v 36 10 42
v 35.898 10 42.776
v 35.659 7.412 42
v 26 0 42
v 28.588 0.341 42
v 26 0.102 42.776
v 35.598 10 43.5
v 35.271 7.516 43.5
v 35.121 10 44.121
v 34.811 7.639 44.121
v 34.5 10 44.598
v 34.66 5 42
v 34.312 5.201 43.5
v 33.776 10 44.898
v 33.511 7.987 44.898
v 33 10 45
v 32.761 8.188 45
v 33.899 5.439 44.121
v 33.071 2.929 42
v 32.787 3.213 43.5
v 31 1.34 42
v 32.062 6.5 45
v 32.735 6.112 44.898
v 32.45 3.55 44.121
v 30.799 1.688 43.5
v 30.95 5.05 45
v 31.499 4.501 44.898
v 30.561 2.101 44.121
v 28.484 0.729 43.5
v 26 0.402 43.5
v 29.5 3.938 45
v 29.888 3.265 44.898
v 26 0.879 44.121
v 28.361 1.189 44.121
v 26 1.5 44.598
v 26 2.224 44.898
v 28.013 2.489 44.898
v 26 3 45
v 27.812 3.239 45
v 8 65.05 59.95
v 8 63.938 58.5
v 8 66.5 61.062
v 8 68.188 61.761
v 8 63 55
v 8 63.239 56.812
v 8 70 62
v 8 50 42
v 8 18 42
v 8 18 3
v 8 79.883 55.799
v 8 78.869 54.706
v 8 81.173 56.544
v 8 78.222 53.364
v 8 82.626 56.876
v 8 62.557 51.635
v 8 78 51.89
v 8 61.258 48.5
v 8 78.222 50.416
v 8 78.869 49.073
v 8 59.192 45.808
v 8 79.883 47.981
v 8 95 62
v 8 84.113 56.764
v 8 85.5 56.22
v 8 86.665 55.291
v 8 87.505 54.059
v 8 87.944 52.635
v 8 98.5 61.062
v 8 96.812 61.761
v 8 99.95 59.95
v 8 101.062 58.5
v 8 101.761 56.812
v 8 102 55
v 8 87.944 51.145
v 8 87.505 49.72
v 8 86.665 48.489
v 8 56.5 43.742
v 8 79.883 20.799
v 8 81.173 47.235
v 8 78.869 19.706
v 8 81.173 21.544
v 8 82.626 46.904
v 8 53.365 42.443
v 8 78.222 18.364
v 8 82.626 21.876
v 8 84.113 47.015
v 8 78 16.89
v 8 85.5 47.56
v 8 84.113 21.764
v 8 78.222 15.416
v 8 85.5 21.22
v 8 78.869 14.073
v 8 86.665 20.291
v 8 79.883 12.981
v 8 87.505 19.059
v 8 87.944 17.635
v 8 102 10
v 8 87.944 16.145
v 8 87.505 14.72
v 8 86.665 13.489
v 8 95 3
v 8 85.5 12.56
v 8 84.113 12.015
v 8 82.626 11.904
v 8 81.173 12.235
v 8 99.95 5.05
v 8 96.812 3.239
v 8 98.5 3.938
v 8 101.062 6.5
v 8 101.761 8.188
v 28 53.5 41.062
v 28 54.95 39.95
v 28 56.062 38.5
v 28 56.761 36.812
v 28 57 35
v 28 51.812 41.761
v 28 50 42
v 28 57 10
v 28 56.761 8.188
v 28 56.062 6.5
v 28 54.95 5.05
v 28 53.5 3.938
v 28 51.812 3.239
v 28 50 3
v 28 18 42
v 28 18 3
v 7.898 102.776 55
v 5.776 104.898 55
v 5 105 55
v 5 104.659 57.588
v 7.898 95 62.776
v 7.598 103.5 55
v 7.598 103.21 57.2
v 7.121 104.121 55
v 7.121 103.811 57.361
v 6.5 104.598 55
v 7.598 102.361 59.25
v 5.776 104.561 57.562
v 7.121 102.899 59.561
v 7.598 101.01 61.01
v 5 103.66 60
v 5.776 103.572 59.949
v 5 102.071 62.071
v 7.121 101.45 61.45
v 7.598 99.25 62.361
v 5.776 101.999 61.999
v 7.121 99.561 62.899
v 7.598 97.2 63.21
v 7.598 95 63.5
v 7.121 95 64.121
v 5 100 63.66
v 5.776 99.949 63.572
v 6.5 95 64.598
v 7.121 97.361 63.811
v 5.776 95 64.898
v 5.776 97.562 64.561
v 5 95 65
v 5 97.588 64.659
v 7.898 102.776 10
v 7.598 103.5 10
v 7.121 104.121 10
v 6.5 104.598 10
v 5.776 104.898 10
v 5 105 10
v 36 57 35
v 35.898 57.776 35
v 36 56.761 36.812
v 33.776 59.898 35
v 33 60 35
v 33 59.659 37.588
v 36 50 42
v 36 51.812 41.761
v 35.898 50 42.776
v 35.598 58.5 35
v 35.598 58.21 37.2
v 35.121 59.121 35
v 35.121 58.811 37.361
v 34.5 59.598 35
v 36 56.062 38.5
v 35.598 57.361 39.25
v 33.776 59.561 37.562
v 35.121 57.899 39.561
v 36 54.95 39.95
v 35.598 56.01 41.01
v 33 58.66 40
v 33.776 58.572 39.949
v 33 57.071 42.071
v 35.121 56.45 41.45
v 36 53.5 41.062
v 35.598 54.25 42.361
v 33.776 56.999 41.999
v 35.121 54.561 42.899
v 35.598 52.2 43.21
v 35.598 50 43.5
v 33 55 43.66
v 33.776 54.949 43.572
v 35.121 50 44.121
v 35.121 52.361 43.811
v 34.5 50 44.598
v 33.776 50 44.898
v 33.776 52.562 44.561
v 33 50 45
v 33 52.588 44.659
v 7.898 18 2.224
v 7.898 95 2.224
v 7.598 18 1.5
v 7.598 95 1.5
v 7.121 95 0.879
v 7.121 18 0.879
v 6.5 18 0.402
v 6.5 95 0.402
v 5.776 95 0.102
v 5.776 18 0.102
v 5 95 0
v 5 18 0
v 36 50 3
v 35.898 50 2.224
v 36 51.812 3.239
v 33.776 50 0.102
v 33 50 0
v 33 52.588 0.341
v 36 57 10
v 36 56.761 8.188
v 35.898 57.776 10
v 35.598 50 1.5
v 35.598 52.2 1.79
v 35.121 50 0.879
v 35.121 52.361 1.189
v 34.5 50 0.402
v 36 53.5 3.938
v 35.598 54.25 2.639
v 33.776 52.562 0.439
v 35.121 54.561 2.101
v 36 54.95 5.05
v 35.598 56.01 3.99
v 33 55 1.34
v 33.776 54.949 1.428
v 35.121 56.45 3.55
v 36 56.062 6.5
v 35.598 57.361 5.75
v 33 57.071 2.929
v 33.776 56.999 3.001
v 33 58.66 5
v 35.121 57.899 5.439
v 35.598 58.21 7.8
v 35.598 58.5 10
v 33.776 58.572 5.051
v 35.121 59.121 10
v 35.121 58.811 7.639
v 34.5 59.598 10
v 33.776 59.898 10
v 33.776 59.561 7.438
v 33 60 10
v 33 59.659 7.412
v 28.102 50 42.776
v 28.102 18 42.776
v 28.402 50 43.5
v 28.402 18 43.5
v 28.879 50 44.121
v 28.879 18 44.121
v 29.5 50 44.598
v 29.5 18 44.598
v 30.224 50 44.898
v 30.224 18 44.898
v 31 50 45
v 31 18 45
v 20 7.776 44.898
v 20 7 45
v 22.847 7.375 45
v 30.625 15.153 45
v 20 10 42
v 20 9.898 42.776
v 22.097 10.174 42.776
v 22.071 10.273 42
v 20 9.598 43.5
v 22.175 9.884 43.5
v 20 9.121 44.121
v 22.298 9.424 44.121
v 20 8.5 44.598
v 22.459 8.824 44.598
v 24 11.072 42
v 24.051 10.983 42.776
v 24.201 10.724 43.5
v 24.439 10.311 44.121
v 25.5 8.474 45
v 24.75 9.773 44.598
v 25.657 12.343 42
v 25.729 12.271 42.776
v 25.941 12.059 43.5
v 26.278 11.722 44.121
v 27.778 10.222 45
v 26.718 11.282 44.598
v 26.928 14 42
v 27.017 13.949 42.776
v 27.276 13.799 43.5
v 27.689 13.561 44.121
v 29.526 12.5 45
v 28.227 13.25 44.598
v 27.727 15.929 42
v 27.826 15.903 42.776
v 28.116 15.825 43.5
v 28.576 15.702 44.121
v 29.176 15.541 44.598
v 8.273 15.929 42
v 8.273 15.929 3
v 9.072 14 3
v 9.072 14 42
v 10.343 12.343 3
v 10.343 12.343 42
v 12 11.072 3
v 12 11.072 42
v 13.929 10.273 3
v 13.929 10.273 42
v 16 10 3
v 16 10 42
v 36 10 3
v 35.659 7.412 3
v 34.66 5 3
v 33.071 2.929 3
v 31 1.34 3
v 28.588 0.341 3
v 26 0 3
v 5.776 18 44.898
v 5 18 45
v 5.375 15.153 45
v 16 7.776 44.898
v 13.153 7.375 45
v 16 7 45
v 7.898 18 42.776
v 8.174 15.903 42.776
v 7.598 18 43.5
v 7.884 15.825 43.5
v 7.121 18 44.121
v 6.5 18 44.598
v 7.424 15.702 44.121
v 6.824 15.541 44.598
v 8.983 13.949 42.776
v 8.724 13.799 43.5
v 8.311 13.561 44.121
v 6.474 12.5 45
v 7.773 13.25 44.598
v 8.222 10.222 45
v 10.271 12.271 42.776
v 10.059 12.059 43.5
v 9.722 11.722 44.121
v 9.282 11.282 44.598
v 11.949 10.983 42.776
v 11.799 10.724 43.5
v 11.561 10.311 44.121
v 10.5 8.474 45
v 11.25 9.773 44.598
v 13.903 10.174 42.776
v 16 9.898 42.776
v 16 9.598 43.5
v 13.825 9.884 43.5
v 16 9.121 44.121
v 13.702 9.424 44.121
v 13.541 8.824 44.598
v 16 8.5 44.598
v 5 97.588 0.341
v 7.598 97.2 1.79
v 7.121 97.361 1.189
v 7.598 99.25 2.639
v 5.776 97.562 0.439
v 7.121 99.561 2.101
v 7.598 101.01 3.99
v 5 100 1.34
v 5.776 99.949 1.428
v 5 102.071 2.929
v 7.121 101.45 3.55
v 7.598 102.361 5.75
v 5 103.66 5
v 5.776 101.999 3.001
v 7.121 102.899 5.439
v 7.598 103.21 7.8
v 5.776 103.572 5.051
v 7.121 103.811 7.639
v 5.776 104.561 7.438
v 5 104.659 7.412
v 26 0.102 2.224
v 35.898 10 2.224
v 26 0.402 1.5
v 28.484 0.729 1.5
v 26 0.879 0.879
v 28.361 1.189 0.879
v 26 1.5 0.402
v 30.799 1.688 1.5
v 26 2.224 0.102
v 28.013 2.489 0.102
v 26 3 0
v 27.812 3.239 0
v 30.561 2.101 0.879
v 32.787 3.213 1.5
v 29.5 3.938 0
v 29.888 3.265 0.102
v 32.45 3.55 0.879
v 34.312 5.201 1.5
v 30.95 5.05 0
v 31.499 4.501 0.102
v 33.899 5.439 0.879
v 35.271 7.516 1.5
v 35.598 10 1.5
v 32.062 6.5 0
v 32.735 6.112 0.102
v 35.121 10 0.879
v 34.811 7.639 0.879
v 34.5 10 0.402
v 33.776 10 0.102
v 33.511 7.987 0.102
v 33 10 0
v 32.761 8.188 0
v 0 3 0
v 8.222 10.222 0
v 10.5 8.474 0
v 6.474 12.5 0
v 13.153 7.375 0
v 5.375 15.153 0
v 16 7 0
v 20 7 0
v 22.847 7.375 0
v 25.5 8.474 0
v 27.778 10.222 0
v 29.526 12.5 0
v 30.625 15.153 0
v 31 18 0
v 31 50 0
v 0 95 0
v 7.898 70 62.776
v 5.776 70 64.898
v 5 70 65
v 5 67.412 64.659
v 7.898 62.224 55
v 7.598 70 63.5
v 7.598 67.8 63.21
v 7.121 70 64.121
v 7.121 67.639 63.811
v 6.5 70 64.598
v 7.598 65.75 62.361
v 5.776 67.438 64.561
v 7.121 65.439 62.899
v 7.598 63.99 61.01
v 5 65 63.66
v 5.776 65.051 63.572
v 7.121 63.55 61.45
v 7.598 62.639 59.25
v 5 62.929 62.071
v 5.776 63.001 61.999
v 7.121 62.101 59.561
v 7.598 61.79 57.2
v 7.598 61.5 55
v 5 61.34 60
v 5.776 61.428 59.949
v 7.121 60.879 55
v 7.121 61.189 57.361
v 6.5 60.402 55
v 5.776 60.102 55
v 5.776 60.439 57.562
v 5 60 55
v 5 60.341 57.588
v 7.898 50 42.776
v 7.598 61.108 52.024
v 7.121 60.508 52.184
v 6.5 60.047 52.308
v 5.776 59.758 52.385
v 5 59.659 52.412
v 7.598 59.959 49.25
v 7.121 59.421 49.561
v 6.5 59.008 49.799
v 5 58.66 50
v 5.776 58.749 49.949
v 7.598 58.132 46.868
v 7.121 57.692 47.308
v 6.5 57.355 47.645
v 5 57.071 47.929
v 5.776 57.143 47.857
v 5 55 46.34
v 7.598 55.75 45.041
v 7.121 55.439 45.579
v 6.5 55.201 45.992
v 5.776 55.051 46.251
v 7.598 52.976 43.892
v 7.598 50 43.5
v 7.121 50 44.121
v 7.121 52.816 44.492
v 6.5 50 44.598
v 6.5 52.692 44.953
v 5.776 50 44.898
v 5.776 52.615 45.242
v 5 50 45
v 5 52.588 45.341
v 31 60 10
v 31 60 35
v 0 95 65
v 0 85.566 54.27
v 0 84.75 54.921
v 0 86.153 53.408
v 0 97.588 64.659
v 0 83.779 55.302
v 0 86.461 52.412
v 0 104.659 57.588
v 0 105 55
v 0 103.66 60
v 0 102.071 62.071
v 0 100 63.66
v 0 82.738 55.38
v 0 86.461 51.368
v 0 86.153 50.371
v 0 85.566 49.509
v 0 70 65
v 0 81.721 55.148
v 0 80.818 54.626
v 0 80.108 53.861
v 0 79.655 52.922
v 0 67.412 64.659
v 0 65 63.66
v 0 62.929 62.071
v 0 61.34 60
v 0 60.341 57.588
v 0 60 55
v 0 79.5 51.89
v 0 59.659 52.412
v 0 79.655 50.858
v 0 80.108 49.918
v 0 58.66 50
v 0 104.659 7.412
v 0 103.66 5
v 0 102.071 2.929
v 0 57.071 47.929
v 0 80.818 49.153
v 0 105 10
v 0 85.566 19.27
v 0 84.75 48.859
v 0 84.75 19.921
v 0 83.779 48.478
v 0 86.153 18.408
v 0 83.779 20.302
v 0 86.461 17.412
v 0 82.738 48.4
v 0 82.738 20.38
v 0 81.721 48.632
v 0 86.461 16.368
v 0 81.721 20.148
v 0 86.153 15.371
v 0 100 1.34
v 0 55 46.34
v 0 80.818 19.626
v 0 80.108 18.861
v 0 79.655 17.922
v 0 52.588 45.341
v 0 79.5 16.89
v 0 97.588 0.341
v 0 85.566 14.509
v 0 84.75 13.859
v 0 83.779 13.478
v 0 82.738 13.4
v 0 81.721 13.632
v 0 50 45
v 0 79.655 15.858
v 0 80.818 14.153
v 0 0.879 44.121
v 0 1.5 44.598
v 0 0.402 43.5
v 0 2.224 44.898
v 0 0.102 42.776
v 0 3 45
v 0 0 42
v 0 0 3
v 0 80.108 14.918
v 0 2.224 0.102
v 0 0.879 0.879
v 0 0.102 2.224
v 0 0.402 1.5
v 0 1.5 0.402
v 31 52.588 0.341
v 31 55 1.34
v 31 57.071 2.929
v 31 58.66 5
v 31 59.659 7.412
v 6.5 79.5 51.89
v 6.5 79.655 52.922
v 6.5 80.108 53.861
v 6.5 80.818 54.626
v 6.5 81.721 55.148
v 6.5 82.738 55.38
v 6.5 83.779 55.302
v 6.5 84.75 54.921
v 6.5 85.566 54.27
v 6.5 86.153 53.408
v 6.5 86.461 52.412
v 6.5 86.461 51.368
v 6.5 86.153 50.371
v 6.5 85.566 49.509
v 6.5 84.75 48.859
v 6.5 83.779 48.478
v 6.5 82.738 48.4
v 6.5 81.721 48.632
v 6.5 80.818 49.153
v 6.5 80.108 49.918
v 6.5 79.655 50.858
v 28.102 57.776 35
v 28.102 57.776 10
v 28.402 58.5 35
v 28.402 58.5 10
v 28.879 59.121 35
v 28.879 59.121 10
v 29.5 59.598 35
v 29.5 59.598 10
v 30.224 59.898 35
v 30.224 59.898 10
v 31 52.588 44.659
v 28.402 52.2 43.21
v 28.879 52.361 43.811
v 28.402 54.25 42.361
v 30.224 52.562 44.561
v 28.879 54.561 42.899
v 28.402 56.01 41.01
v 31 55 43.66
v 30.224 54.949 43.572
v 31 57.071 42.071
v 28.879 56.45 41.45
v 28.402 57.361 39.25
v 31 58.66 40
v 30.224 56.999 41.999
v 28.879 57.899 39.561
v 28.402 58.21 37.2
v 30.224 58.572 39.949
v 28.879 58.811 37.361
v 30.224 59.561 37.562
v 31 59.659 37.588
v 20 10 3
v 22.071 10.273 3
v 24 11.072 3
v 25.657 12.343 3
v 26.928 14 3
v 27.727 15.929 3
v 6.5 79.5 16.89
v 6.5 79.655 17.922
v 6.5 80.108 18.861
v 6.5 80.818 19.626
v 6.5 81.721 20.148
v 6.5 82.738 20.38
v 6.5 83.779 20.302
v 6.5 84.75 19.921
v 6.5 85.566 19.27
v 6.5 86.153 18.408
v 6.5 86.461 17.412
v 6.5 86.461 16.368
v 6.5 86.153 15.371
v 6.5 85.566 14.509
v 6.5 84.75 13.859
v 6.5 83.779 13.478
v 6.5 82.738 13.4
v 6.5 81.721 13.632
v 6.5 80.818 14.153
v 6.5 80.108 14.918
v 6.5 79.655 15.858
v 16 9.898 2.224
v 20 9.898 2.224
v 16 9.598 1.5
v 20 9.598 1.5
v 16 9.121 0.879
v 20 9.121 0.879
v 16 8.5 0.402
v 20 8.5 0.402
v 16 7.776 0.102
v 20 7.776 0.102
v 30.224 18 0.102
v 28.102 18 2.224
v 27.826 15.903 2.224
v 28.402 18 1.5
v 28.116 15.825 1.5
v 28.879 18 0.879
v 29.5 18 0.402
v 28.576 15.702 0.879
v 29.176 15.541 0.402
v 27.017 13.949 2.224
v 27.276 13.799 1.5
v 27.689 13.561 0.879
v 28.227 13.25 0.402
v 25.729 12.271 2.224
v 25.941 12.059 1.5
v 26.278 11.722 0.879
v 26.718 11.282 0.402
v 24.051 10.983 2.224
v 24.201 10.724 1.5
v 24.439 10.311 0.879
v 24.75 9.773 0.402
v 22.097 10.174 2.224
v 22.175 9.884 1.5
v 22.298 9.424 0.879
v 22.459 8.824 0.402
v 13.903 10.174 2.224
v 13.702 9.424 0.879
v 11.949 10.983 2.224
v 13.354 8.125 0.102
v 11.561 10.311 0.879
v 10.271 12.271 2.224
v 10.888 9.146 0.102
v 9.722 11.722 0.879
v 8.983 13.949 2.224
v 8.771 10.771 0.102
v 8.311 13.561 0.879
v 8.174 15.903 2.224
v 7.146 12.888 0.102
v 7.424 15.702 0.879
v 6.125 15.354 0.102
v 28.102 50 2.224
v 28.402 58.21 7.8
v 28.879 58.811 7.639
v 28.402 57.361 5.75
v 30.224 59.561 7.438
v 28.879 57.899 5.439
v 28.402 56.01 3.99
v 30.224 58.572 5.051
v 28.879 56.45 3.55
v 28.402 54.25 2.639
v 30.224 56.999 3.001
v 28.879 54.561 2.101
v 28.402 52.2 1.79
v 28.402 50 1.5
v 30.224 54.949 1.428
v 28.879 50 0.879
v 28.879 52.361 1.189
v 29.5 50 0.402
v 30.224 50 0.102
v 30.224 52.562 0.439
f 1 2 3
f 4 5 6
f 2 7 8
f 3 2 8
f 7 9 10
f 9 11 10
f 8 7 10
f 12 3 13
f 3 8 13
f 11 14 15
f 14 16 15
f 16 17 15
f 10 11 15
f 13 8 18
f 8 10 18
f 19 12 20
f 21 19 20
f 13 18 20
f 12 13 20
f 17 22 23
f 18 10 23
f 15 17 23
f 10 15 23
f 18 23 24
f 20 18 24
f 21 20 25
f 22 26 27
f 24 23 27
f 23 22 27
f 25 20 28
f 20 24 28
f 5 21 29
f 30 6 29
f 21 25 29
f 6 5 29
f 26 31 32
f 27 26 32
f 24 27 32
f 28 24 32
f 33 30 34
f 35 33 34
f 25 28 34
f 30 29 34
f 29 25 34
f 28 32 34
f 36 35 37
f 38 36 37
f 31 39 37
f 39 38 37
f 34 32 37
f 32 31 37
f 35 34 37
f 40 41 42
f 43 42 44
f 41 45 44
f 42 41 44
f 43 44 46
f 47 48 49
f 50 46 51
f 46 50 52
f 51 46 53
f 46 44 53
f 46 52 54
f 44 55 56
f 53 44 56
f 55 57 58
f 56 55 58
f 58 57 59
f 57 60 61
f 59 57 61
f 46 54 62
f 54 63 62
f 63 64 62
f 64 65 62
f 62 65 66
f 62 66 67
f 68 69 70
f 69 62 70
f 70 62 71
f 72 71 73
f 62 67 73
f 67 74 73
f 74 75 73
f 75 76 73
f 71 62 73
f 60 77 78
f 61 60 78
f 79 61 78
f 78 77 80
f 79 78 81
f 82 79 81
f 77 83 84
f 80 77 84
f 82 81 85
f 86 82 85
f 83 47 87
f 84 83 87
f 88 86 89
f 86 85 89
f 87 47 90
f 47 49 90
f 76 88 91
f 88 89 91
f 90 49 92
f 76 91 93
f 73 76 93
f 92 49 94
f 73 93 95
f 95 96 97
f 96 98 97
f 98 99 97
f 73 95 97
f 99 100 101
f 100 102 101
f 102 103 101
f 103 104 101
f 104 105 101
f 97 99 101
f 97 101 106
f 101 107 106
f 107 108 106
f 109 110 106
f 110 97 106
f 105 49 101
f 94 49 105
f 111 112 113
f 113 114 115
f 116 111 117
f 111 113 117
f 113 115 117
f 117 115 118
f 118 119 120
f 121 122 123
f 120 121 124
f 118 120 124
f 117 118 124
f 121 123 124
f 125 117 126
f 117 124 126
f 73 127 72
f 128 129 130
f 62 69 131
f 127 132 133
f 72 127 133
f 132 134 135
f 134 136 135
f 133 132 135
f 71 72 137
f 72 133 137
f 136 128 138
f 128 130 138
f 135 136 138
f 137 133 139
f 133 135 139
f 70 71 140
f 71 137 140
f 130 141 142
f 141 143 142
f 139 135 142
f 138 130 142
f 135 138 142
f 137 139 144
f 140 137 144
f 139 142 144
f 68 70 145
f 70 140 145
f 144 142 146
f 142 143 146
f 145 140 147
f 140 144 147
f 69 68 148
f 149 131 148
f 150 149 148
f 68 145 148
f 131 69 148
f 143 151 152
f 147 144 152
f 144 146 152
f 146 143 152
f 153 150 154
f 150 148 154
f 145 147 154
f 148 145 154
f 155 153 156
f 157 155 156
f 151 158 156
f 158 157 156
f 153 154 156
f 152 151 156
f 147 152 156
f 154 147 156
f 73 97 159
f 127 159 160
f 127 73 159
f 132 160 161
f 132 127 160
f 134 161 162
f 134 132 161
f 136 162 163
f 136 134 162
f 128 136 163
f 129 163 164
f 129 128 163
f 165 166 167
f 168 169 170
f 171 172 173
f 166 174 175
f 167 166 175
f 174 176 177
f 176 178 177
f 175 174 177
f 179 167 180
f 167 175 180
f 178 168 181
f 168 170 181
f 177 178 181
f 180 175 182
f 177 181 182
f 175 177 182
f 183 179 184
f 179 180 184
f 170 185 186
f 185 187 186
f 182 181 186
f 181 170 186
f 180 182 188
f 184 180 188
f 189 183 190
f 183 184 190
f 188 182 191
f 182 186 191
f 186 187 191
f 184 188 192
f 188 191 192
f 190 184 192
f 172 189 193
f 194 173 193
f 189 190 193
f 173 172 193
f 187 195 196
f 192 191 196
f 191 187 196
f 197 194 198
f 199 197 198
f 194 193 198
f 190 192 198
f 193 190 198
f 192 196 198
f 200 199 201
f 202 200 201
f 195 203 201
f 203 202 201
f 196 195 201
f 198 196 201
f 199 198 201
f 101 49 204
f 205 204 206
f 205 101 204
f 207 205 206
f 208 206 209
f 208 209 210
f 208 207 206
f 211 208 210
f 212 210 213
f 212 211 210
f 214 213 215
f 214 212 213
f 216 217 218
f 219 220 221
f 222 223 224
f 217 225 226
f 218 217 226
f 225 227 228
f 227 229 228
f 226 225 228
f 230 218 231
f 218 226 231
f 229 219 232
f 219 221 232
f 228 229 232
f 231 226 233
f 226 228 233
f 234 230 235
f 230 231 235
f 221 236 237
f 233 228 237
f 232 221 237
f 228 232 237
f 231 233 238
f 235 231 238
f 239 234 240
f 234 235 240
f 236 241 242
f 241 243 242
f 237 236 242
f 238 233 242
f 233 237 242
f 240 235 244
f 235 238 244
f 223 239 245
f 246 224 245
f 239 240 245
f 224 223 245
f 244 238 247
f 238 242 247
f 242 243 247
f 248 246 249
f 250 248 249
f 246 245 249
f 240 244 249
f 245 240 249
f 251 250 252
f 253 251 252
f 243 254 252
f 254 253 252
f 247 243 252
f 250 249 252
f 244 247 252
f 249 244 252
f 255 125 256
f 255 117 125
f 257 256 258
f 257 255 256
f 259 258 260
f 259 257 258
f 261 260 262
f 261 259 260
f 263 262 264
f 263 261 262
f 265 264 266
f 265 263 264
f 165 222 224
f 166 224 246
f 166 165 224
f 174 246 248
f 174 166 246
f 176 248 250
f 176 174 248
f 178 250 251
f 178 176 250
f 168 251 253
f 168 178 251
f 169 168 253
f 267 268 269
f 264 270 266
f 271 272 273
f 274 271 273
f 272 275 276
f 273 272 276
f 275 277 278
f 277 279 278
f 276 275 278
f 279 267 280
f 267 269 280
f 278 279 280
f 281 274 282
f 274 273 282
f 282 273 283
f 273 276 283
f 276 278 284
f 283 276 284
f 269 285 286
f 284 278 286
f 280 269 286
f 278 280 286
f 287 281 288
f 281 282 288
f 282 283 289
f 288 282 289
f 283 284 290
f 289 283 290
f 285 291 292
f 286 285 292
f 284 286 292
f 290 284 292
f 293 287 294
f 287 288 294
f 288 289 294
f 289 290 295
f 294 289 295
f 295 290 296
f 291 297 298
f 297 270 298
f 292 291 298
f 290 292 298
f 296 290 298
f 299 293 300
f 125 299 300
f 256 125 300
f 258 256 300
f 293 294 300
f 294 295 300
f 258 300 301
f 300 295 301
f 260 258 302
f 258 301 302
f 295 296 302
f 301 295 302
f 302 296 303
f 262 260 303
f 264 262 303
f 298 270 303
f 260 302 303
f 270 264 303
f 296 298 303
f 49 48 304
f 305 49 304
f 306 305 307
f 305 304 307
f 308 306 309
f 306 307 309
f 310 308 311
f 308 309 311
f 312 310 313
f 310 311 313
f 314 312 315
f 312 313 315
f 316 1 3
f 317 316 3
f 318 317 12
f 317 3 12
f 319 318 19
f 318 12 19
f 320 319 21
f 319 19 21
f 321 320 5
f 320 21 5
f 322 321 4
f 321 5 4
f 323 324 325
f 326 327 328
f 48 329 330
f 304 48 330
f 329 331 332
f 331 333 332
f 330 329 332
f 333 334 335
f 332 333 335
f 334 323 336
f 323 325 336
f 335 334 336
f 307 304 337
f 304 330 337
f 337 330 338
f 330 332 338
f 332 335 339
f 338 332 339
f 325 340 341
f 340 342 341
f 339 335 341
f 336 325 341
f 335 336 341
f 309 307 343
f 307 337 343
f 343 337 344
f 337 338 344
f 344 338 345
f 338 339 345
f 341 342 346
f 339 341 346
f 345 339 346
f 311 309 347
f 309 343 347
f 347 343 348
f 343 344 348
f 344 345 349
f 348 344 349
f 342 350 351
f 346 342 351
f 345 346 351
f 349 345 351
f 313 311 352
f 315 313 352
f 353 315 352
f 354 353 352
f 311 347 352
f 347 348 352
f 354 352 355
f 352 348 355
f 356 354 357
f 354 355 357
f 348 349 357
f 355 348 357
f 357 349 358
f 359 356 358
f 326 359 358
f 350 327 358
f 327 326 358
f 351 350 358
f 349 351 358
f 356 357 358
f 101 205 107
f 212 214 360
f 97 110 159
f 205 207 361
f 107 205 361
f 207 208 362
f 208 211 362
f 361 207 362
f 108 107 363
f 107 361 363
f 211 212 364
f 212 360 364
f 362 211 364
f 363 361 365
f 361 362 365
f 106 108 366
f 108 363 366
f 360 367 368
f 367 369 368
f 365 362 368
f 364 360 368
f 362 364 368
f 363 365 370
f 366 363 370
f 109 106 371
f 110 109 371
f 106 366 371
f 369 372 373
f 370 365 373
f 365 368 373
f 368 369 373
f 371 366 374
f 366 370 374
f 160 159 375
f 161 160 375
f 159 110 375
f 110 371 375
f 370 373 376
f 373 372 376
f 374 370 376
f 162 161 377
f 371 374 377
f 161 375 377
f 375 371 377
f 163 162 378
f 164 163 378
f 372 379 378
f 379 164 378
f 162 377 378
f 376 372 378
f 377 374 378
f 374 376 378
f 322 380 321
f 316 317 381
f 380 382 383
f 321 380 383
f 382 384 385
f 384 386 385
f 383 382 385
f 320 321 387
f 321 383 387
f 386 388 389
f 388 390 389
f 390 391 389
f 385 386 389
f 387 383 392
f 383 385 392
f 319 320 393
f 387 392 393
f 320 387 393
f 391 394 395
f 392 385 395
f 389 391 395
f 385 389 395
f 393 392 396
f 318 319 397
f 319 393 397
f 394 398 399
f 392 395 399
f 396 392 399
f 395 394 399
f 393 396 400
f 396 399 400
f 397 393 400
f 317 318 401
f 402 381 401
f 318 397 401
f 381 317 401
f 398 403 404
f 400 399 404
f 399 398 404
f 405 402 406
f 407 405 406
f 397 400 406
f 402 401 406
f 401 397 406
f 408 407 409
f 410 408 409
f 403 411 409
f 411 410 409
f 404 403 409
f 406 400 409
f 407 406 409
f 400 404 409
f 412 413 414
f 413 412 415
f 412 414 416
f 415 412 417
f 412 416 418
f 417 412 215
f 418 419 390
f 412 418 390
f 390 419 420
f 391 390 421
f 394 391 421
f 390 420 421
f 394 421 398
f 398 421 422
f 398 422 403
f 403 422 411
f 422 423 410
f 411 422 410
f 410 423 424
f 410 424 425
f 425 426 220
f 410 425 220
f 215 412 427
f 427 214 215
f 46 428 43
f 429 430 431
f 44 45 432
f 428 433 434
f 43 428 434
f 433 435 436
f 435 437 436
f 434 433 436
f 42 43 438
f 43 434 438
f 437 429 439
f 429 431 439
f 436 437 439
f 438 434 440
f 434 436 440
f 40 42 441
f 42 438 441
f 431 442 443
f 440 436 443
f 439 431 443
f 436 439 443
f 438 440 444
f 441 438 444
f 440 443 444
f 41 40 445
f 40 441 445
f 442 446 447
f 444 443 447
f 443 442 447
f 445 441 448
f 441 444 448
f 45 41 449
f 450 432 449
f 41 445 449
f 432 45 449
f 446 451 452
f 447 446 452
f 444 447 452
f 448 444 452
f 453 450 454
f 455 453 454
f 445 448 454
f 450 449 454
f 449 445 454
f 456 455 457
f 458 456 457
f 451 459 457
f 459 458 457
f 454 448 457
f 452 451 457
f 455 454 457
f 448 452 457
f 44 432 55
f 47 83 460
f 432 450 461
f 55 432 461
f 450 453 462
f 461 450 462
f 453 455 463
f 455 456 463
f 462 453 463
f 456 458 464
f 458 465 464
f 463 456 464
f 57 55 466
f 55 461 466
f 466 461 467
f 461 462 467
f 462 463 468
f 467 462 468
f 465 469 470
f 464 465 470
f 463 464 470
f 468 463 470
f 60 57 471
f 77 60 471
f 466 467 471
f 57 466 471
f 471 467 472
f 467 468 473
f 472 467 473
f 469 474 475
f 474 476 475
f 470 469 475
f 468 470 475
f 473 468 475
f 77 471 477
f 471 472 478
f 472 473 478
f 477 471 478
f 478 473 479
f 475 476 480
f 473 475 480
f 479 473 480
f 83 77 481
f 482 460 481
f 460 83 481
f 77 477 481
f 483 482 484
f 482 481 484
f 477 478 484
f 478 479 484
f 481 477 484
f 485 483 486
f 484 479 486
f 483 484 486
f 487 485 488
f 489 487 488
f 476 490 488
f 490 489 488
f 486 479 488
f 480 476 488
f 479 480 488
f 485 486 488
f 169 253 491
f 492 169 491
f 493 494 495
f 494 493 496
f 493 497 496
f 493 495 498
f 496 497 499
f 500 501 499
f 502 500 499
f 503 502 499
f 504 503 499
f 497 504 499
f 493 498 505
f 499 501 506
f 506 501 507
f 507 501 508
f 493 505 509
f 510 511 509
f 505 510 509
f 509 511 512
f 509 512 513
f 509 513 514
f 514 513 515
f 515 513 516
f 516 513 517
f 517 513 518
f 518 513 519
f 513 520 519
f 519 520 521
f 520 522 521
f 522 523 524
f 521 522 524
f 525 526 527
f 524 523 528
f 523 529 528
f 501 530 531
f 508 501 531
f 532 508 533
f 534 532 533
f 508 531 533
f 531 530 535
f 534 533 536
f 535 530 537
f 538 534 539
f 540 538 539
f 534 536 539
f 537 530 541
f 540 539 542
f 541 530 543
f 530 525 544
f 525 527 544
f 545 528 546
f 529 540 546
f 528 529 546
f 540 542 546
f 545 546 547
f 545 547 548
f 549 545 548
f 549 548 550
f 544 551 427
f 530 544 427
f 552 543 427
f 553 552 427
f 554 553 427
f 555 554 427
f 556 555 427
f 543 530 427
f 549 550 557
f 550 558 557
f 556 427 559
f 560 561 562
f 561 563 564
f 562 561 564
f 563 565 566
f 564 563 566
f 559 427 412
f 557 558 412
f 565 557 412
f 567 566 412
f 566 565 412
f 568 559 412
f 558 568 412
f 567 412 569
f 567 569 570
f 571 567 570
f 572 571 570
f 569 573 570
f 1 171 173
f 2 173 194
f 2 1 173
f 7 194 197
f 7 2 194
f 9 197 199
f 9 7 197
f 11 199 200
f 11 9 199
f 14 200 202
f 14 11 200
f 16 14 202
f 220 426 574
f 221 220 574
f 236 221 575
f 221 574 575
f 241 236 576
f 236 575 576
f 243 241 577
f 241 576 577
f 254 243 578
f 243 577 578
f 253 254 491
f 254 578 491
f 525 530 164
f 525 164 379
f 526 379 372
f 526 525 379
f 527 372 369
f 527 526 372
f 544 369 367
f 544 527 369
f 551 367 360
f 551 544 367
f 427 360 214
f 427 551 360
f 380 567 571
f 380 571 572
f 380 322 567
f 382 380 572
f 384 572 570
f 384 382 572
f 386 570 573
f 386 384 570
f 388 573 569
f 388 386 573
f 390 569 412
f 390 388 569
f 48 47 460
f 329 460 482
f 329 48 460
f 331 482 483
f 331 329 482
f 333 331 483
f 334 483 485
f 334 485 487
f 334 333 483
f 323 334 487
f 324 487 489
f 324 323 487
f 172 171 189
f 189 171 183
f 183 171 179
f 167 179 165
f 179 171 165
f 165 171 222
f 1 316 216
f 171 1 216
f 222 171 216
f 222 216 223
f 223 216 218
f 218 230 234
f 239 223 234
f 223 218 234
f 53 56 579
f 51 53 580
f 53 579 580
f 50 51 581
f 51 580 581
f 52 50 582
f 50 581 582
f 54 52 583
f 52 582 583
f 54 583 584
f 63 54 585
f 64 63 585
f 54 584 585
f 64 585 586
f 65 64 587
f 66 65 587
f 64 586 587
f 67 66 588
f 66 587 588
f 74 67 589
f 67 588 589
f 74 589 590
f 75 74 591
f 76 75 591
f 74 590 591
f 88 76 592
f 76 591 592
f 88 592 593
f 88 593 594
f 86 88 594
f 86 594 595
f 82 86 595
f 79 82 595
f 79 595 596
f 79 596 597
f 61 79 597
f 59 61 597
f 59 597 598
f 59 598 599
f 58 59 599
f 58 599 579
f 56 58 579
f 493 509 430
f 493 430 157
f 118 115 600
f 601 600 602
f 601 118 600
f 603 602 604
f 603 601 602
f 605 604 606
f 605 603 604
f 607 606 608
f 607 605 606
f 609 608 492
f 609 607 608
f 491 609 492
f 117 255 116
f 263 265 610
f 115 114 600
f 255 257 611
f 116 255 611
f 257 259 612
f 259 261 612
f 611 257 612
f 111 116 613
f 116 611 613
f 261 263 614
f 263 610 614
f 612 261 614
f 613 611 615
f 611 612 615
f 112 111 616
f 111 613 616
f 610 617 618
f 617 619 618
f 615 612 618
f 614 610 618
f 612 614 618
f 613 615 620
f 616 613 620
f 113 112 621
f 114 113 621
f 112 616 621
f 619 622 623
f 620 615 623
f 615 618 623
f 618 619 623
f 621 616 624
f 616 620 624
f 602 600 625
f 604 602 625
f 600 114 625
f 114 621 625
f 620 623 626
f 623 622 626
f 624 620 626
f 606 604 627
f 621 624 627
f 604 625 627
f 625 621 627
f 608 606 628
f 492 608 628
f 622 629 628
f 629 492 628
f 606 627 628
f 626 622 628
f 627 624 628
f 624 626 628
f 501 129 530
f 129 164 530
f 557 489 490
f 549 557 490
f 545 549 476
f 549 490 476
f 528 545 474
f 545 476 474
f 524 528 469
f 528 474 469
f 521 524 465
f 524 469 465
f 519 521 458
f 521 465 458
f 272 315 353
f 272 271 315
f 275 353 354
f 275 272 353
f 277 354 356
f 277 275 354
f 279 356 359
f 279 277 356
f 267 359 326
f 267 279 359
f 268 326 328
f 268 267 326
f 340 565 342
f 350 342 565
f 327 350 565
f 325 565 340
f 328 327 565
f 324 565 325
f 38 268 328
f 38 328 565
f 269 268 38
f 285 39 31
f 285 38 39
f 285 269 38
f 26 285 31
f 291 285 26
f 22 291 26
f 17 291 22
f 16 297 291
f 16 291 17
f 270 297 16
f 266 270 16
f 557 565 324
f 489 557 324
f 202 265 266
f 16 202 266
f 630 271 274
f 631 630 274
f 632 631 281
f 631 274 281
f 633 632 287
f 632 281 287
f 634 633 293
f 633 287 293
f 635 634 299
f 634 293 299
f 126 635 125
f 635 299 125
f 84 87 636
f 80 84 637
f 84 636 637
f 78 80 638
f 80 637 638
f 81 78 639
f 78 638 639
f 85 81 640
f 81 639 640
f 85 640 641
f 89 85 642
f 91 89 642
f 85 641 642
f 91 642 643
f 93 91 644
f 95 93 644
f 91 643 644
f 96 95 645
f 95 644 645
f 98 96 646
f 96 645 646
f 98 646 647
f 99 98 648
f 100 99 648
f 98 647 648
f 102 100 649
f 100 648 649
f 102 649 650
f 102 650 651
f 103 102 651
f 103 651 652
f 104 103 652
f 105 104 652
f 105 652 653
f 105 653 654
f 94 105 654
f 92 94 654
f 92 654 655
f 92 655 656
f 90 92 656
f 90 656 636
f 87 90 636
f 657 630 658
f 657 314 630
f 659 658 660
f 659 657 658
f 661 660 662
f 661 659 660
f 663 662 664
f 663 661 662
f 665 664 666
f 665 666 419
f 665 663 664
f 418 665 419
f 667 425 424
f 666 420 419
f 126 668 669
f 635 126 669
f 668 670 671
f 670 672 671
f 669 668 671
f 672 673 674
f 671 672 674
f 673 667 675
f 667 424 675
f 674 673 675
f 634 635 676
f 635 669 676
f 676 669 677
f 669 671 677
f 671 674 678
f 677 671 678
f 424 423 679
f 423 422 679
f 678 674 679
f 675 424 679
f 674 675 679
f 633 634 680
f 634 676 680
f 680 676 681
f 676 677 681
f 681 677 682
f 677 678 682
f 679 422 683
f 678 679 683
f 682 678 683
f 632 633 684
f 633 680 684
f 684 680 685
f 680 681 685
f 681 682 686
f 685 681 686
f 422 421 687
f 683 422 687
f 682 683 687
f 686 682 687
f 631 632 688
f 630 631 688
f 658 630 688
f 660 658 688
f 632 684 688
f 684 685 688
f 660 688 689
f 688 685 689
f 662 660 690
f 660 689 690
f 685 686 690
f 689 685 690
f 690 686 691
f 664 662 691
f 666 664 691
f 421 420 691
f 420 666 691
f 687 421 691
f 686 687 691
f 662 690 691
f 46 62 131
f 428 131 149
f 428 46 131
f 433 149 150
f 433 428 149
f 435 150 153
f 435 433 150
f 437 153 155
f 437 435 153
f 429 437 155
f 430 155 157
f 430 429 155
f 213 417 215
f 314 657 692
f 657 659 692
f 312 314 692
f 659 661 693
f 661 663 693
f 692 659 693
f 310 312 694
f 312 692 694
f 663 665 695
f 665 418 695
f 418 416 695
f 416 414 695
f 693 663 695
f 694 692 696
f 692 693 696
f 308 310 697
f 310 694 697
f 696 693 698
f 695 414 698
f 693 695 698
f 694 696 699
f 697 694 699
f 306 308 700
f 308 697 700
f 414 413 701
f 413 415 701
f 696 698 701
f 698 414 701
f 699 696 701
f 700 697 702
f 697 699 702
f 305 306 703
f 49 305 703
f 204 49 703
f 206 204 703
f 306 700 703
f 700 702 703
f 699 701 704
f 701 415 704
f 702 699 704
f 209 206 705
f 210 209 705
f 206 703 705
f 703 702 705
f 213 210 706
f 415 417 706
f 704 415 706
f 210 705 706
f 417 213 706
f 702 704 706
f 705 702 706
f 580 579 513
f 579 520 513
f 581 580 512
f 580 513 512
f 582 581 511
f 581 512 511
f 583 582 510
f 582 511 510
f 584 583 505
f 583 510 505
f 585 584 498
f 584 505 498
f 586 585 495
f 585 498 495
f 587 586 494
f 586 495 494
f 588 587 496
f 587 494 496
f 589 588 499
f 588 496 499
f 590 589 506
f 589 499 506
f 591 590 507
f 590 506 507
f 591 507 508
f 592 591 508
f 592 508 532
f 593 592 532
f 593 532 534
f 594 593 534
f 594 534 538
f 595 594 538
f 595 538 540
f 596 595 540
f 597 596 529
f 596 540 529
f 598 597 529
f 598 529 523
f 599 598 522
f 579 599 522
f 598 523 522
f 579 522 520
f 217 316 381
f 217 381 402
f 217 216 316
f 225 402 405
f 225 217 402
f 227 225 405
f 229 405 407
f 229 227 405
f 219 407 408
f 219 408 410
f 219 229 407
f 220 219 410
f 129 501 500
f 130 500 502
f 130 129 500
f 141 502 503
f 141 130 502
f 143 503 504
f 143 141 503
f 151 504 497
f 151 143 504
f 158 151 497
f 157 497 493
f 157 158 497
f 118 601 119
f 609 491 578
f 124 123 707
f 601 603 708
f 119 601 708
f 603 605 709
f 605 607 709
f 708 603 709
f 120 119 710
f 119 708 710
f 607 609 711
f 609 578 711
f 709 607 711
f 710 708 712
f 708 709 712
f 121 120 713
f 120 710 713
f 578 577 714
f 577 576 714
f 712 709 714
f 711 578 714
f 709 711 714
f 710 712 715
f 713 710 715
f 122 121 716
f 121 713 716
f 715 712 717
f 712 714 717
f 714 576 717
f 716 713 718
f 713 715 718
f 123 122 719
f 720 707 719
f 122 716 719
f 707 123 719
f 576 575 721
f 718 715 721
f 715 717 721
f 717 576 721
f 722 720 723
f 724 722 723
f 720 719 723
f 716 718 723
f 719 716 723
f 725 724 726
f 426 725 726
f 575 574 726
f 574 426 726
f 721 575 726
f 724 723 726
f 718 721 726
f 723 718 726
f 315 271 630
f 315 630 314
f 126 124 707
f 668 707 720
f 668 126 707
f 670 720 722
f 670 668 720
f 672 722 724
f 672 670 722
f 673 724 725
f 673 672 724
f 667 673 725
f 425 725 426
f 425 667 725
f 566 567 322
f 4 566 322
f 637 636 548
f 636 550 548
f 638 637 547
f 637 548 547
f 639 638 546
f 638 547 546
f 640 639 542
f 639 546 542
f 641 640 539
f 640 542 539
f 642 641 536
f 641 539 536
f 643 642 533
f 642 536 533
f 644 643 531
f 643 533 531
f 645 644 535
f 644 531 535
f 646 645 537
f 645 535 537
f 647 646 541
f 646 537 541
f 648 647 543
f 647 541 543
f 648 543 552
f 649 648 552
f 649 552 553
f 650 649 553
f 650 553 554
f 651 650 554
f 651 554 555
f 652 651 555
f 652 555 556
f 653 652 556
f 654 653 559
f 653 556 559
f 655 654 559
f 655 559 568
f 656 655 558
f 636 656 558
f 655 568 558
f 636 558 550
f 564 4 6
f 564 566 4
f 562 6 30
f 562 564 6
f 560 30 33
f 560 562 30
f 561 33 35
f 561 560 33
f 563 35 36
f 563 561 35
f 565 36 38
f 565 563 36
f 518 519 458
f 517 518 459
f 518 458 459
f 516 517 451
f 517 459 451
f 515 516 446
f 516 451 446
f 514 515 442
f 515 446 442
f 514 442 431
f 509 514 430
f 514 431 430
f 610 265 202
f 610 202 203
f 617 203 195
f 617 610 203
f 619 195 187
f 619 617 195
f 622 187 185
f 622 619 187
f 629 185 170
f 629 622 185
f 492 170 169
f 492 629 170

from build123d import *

# Parameters (mm, degrees)
F1_DEPTH       = 45
F2_W           = 45
F2_H           = 65
F3_DEPTH       = 8
F4_R           = 9.99999
F6_R           = 8
F7_R           = 3
F9_D           = 7
F9_CSINK_D     = 10
F9_CSINK_ANGLE = 90


# Not quite as in the source:
# - two fillets or chamfers of one size are made in one step
# - a fillet or chamfer is up to 0.001 mm smaller than in the source, because OpenCascade refuses the exact size


with BuildPart() as f1:
    # F0 (on Top) → F1 (new body)
    with BuildSketch(Plane.XY):
        Polygon((8, 105), (0, 105), (0, 0), (36, 0), (36, 60), (28, 60), (28, 10), (8, 10), align=None)
    extrude(amount=F1_DEPTH)

    # F2 (on Right) → F3 (join, through all)
    with BuildSketch(Plane.YZ):
        with Locations((82.5, 32.5)):
            Rectangle(F2_W, F2_H)
    extrude(amount=F3_DEPTH)

    # F4 (radius 10 in the source; OpenCascade refuses exactly that, so slightly less here)
    f4_edges = [f1.edges().sort_by_distance(p)[0] for p in [
        (4, 60, 45),
        (4, 105, 0),
        (4, 105, 65),
        (4, 60, 65),
        (32, 60, 45),
        (32, 60, 0),
        (36, 0, 22.5),
    ]]
    fillet(f4_edges, radius=F4_R)

    # F6
    f6_edges = [f1.edges().sort_by_distance(p)[0] for p in [
        (8, 10, 22.5),
        (28, 10, 22.5),
    ]]
    fillet(f6_edges, radius=F6_R)

    # F7
    f7_edges = [f1.edges().sort_by_distance(p)[0] for p in [
        (36, 60, 22.5),
        (36, 57.071071, 2.928929),
        (36, 57.071071, 42.071071),
        (36, 30, 0),
        (36, 30, 45),
        (36, 9.99999, 22.5),
        (8, 56.500005, 0),
        (8, 18, 22.5),
        (8, 102.071071, 2.928929),
        (8, 34.000005, 45),
        (8, 105, 32.5),
        (8, 57.071071, 47.928929),
        (8, 102.071071, 62.071071),
        (8, 60, 55),
        (8, 82.5, 65),
        (8, 62.928929, 62.071071),
        (10.343146, 12.343146, 0),
        (18, 10, 0),
        (25.656854, 12.343146, 0),
        (13.000005, 0, 0),
        (28, 34.000005, 0),
        (33.071071, 2.928929, 0),
        (10.343146, 12.343146, 45),
        (18, 10, 45),
        (25.656854, 12.343146, 45),
        (13.000005, 0, 45),
        (28, 34.000005, 45),
        (33.071071, 2.928929, 45),
        (28, 57.071071, 2.928929),
        (28, 60, 22.5),
        (28, 57.071071, 42.071071),
    ]]
    fillet(f7_edges, radius=F7_R)

    # F9 (through all)
    with Locations(Plane.YZ.offset(8)):
        with Locations((83, 51.8898591027), (83, 16.8898591027)):
            CounterSinkHole(F9_D / 2, F9_CSINK_D / 2, counter_sink_angle=F9_CSINK_ANGLE)


solid = f1.part
